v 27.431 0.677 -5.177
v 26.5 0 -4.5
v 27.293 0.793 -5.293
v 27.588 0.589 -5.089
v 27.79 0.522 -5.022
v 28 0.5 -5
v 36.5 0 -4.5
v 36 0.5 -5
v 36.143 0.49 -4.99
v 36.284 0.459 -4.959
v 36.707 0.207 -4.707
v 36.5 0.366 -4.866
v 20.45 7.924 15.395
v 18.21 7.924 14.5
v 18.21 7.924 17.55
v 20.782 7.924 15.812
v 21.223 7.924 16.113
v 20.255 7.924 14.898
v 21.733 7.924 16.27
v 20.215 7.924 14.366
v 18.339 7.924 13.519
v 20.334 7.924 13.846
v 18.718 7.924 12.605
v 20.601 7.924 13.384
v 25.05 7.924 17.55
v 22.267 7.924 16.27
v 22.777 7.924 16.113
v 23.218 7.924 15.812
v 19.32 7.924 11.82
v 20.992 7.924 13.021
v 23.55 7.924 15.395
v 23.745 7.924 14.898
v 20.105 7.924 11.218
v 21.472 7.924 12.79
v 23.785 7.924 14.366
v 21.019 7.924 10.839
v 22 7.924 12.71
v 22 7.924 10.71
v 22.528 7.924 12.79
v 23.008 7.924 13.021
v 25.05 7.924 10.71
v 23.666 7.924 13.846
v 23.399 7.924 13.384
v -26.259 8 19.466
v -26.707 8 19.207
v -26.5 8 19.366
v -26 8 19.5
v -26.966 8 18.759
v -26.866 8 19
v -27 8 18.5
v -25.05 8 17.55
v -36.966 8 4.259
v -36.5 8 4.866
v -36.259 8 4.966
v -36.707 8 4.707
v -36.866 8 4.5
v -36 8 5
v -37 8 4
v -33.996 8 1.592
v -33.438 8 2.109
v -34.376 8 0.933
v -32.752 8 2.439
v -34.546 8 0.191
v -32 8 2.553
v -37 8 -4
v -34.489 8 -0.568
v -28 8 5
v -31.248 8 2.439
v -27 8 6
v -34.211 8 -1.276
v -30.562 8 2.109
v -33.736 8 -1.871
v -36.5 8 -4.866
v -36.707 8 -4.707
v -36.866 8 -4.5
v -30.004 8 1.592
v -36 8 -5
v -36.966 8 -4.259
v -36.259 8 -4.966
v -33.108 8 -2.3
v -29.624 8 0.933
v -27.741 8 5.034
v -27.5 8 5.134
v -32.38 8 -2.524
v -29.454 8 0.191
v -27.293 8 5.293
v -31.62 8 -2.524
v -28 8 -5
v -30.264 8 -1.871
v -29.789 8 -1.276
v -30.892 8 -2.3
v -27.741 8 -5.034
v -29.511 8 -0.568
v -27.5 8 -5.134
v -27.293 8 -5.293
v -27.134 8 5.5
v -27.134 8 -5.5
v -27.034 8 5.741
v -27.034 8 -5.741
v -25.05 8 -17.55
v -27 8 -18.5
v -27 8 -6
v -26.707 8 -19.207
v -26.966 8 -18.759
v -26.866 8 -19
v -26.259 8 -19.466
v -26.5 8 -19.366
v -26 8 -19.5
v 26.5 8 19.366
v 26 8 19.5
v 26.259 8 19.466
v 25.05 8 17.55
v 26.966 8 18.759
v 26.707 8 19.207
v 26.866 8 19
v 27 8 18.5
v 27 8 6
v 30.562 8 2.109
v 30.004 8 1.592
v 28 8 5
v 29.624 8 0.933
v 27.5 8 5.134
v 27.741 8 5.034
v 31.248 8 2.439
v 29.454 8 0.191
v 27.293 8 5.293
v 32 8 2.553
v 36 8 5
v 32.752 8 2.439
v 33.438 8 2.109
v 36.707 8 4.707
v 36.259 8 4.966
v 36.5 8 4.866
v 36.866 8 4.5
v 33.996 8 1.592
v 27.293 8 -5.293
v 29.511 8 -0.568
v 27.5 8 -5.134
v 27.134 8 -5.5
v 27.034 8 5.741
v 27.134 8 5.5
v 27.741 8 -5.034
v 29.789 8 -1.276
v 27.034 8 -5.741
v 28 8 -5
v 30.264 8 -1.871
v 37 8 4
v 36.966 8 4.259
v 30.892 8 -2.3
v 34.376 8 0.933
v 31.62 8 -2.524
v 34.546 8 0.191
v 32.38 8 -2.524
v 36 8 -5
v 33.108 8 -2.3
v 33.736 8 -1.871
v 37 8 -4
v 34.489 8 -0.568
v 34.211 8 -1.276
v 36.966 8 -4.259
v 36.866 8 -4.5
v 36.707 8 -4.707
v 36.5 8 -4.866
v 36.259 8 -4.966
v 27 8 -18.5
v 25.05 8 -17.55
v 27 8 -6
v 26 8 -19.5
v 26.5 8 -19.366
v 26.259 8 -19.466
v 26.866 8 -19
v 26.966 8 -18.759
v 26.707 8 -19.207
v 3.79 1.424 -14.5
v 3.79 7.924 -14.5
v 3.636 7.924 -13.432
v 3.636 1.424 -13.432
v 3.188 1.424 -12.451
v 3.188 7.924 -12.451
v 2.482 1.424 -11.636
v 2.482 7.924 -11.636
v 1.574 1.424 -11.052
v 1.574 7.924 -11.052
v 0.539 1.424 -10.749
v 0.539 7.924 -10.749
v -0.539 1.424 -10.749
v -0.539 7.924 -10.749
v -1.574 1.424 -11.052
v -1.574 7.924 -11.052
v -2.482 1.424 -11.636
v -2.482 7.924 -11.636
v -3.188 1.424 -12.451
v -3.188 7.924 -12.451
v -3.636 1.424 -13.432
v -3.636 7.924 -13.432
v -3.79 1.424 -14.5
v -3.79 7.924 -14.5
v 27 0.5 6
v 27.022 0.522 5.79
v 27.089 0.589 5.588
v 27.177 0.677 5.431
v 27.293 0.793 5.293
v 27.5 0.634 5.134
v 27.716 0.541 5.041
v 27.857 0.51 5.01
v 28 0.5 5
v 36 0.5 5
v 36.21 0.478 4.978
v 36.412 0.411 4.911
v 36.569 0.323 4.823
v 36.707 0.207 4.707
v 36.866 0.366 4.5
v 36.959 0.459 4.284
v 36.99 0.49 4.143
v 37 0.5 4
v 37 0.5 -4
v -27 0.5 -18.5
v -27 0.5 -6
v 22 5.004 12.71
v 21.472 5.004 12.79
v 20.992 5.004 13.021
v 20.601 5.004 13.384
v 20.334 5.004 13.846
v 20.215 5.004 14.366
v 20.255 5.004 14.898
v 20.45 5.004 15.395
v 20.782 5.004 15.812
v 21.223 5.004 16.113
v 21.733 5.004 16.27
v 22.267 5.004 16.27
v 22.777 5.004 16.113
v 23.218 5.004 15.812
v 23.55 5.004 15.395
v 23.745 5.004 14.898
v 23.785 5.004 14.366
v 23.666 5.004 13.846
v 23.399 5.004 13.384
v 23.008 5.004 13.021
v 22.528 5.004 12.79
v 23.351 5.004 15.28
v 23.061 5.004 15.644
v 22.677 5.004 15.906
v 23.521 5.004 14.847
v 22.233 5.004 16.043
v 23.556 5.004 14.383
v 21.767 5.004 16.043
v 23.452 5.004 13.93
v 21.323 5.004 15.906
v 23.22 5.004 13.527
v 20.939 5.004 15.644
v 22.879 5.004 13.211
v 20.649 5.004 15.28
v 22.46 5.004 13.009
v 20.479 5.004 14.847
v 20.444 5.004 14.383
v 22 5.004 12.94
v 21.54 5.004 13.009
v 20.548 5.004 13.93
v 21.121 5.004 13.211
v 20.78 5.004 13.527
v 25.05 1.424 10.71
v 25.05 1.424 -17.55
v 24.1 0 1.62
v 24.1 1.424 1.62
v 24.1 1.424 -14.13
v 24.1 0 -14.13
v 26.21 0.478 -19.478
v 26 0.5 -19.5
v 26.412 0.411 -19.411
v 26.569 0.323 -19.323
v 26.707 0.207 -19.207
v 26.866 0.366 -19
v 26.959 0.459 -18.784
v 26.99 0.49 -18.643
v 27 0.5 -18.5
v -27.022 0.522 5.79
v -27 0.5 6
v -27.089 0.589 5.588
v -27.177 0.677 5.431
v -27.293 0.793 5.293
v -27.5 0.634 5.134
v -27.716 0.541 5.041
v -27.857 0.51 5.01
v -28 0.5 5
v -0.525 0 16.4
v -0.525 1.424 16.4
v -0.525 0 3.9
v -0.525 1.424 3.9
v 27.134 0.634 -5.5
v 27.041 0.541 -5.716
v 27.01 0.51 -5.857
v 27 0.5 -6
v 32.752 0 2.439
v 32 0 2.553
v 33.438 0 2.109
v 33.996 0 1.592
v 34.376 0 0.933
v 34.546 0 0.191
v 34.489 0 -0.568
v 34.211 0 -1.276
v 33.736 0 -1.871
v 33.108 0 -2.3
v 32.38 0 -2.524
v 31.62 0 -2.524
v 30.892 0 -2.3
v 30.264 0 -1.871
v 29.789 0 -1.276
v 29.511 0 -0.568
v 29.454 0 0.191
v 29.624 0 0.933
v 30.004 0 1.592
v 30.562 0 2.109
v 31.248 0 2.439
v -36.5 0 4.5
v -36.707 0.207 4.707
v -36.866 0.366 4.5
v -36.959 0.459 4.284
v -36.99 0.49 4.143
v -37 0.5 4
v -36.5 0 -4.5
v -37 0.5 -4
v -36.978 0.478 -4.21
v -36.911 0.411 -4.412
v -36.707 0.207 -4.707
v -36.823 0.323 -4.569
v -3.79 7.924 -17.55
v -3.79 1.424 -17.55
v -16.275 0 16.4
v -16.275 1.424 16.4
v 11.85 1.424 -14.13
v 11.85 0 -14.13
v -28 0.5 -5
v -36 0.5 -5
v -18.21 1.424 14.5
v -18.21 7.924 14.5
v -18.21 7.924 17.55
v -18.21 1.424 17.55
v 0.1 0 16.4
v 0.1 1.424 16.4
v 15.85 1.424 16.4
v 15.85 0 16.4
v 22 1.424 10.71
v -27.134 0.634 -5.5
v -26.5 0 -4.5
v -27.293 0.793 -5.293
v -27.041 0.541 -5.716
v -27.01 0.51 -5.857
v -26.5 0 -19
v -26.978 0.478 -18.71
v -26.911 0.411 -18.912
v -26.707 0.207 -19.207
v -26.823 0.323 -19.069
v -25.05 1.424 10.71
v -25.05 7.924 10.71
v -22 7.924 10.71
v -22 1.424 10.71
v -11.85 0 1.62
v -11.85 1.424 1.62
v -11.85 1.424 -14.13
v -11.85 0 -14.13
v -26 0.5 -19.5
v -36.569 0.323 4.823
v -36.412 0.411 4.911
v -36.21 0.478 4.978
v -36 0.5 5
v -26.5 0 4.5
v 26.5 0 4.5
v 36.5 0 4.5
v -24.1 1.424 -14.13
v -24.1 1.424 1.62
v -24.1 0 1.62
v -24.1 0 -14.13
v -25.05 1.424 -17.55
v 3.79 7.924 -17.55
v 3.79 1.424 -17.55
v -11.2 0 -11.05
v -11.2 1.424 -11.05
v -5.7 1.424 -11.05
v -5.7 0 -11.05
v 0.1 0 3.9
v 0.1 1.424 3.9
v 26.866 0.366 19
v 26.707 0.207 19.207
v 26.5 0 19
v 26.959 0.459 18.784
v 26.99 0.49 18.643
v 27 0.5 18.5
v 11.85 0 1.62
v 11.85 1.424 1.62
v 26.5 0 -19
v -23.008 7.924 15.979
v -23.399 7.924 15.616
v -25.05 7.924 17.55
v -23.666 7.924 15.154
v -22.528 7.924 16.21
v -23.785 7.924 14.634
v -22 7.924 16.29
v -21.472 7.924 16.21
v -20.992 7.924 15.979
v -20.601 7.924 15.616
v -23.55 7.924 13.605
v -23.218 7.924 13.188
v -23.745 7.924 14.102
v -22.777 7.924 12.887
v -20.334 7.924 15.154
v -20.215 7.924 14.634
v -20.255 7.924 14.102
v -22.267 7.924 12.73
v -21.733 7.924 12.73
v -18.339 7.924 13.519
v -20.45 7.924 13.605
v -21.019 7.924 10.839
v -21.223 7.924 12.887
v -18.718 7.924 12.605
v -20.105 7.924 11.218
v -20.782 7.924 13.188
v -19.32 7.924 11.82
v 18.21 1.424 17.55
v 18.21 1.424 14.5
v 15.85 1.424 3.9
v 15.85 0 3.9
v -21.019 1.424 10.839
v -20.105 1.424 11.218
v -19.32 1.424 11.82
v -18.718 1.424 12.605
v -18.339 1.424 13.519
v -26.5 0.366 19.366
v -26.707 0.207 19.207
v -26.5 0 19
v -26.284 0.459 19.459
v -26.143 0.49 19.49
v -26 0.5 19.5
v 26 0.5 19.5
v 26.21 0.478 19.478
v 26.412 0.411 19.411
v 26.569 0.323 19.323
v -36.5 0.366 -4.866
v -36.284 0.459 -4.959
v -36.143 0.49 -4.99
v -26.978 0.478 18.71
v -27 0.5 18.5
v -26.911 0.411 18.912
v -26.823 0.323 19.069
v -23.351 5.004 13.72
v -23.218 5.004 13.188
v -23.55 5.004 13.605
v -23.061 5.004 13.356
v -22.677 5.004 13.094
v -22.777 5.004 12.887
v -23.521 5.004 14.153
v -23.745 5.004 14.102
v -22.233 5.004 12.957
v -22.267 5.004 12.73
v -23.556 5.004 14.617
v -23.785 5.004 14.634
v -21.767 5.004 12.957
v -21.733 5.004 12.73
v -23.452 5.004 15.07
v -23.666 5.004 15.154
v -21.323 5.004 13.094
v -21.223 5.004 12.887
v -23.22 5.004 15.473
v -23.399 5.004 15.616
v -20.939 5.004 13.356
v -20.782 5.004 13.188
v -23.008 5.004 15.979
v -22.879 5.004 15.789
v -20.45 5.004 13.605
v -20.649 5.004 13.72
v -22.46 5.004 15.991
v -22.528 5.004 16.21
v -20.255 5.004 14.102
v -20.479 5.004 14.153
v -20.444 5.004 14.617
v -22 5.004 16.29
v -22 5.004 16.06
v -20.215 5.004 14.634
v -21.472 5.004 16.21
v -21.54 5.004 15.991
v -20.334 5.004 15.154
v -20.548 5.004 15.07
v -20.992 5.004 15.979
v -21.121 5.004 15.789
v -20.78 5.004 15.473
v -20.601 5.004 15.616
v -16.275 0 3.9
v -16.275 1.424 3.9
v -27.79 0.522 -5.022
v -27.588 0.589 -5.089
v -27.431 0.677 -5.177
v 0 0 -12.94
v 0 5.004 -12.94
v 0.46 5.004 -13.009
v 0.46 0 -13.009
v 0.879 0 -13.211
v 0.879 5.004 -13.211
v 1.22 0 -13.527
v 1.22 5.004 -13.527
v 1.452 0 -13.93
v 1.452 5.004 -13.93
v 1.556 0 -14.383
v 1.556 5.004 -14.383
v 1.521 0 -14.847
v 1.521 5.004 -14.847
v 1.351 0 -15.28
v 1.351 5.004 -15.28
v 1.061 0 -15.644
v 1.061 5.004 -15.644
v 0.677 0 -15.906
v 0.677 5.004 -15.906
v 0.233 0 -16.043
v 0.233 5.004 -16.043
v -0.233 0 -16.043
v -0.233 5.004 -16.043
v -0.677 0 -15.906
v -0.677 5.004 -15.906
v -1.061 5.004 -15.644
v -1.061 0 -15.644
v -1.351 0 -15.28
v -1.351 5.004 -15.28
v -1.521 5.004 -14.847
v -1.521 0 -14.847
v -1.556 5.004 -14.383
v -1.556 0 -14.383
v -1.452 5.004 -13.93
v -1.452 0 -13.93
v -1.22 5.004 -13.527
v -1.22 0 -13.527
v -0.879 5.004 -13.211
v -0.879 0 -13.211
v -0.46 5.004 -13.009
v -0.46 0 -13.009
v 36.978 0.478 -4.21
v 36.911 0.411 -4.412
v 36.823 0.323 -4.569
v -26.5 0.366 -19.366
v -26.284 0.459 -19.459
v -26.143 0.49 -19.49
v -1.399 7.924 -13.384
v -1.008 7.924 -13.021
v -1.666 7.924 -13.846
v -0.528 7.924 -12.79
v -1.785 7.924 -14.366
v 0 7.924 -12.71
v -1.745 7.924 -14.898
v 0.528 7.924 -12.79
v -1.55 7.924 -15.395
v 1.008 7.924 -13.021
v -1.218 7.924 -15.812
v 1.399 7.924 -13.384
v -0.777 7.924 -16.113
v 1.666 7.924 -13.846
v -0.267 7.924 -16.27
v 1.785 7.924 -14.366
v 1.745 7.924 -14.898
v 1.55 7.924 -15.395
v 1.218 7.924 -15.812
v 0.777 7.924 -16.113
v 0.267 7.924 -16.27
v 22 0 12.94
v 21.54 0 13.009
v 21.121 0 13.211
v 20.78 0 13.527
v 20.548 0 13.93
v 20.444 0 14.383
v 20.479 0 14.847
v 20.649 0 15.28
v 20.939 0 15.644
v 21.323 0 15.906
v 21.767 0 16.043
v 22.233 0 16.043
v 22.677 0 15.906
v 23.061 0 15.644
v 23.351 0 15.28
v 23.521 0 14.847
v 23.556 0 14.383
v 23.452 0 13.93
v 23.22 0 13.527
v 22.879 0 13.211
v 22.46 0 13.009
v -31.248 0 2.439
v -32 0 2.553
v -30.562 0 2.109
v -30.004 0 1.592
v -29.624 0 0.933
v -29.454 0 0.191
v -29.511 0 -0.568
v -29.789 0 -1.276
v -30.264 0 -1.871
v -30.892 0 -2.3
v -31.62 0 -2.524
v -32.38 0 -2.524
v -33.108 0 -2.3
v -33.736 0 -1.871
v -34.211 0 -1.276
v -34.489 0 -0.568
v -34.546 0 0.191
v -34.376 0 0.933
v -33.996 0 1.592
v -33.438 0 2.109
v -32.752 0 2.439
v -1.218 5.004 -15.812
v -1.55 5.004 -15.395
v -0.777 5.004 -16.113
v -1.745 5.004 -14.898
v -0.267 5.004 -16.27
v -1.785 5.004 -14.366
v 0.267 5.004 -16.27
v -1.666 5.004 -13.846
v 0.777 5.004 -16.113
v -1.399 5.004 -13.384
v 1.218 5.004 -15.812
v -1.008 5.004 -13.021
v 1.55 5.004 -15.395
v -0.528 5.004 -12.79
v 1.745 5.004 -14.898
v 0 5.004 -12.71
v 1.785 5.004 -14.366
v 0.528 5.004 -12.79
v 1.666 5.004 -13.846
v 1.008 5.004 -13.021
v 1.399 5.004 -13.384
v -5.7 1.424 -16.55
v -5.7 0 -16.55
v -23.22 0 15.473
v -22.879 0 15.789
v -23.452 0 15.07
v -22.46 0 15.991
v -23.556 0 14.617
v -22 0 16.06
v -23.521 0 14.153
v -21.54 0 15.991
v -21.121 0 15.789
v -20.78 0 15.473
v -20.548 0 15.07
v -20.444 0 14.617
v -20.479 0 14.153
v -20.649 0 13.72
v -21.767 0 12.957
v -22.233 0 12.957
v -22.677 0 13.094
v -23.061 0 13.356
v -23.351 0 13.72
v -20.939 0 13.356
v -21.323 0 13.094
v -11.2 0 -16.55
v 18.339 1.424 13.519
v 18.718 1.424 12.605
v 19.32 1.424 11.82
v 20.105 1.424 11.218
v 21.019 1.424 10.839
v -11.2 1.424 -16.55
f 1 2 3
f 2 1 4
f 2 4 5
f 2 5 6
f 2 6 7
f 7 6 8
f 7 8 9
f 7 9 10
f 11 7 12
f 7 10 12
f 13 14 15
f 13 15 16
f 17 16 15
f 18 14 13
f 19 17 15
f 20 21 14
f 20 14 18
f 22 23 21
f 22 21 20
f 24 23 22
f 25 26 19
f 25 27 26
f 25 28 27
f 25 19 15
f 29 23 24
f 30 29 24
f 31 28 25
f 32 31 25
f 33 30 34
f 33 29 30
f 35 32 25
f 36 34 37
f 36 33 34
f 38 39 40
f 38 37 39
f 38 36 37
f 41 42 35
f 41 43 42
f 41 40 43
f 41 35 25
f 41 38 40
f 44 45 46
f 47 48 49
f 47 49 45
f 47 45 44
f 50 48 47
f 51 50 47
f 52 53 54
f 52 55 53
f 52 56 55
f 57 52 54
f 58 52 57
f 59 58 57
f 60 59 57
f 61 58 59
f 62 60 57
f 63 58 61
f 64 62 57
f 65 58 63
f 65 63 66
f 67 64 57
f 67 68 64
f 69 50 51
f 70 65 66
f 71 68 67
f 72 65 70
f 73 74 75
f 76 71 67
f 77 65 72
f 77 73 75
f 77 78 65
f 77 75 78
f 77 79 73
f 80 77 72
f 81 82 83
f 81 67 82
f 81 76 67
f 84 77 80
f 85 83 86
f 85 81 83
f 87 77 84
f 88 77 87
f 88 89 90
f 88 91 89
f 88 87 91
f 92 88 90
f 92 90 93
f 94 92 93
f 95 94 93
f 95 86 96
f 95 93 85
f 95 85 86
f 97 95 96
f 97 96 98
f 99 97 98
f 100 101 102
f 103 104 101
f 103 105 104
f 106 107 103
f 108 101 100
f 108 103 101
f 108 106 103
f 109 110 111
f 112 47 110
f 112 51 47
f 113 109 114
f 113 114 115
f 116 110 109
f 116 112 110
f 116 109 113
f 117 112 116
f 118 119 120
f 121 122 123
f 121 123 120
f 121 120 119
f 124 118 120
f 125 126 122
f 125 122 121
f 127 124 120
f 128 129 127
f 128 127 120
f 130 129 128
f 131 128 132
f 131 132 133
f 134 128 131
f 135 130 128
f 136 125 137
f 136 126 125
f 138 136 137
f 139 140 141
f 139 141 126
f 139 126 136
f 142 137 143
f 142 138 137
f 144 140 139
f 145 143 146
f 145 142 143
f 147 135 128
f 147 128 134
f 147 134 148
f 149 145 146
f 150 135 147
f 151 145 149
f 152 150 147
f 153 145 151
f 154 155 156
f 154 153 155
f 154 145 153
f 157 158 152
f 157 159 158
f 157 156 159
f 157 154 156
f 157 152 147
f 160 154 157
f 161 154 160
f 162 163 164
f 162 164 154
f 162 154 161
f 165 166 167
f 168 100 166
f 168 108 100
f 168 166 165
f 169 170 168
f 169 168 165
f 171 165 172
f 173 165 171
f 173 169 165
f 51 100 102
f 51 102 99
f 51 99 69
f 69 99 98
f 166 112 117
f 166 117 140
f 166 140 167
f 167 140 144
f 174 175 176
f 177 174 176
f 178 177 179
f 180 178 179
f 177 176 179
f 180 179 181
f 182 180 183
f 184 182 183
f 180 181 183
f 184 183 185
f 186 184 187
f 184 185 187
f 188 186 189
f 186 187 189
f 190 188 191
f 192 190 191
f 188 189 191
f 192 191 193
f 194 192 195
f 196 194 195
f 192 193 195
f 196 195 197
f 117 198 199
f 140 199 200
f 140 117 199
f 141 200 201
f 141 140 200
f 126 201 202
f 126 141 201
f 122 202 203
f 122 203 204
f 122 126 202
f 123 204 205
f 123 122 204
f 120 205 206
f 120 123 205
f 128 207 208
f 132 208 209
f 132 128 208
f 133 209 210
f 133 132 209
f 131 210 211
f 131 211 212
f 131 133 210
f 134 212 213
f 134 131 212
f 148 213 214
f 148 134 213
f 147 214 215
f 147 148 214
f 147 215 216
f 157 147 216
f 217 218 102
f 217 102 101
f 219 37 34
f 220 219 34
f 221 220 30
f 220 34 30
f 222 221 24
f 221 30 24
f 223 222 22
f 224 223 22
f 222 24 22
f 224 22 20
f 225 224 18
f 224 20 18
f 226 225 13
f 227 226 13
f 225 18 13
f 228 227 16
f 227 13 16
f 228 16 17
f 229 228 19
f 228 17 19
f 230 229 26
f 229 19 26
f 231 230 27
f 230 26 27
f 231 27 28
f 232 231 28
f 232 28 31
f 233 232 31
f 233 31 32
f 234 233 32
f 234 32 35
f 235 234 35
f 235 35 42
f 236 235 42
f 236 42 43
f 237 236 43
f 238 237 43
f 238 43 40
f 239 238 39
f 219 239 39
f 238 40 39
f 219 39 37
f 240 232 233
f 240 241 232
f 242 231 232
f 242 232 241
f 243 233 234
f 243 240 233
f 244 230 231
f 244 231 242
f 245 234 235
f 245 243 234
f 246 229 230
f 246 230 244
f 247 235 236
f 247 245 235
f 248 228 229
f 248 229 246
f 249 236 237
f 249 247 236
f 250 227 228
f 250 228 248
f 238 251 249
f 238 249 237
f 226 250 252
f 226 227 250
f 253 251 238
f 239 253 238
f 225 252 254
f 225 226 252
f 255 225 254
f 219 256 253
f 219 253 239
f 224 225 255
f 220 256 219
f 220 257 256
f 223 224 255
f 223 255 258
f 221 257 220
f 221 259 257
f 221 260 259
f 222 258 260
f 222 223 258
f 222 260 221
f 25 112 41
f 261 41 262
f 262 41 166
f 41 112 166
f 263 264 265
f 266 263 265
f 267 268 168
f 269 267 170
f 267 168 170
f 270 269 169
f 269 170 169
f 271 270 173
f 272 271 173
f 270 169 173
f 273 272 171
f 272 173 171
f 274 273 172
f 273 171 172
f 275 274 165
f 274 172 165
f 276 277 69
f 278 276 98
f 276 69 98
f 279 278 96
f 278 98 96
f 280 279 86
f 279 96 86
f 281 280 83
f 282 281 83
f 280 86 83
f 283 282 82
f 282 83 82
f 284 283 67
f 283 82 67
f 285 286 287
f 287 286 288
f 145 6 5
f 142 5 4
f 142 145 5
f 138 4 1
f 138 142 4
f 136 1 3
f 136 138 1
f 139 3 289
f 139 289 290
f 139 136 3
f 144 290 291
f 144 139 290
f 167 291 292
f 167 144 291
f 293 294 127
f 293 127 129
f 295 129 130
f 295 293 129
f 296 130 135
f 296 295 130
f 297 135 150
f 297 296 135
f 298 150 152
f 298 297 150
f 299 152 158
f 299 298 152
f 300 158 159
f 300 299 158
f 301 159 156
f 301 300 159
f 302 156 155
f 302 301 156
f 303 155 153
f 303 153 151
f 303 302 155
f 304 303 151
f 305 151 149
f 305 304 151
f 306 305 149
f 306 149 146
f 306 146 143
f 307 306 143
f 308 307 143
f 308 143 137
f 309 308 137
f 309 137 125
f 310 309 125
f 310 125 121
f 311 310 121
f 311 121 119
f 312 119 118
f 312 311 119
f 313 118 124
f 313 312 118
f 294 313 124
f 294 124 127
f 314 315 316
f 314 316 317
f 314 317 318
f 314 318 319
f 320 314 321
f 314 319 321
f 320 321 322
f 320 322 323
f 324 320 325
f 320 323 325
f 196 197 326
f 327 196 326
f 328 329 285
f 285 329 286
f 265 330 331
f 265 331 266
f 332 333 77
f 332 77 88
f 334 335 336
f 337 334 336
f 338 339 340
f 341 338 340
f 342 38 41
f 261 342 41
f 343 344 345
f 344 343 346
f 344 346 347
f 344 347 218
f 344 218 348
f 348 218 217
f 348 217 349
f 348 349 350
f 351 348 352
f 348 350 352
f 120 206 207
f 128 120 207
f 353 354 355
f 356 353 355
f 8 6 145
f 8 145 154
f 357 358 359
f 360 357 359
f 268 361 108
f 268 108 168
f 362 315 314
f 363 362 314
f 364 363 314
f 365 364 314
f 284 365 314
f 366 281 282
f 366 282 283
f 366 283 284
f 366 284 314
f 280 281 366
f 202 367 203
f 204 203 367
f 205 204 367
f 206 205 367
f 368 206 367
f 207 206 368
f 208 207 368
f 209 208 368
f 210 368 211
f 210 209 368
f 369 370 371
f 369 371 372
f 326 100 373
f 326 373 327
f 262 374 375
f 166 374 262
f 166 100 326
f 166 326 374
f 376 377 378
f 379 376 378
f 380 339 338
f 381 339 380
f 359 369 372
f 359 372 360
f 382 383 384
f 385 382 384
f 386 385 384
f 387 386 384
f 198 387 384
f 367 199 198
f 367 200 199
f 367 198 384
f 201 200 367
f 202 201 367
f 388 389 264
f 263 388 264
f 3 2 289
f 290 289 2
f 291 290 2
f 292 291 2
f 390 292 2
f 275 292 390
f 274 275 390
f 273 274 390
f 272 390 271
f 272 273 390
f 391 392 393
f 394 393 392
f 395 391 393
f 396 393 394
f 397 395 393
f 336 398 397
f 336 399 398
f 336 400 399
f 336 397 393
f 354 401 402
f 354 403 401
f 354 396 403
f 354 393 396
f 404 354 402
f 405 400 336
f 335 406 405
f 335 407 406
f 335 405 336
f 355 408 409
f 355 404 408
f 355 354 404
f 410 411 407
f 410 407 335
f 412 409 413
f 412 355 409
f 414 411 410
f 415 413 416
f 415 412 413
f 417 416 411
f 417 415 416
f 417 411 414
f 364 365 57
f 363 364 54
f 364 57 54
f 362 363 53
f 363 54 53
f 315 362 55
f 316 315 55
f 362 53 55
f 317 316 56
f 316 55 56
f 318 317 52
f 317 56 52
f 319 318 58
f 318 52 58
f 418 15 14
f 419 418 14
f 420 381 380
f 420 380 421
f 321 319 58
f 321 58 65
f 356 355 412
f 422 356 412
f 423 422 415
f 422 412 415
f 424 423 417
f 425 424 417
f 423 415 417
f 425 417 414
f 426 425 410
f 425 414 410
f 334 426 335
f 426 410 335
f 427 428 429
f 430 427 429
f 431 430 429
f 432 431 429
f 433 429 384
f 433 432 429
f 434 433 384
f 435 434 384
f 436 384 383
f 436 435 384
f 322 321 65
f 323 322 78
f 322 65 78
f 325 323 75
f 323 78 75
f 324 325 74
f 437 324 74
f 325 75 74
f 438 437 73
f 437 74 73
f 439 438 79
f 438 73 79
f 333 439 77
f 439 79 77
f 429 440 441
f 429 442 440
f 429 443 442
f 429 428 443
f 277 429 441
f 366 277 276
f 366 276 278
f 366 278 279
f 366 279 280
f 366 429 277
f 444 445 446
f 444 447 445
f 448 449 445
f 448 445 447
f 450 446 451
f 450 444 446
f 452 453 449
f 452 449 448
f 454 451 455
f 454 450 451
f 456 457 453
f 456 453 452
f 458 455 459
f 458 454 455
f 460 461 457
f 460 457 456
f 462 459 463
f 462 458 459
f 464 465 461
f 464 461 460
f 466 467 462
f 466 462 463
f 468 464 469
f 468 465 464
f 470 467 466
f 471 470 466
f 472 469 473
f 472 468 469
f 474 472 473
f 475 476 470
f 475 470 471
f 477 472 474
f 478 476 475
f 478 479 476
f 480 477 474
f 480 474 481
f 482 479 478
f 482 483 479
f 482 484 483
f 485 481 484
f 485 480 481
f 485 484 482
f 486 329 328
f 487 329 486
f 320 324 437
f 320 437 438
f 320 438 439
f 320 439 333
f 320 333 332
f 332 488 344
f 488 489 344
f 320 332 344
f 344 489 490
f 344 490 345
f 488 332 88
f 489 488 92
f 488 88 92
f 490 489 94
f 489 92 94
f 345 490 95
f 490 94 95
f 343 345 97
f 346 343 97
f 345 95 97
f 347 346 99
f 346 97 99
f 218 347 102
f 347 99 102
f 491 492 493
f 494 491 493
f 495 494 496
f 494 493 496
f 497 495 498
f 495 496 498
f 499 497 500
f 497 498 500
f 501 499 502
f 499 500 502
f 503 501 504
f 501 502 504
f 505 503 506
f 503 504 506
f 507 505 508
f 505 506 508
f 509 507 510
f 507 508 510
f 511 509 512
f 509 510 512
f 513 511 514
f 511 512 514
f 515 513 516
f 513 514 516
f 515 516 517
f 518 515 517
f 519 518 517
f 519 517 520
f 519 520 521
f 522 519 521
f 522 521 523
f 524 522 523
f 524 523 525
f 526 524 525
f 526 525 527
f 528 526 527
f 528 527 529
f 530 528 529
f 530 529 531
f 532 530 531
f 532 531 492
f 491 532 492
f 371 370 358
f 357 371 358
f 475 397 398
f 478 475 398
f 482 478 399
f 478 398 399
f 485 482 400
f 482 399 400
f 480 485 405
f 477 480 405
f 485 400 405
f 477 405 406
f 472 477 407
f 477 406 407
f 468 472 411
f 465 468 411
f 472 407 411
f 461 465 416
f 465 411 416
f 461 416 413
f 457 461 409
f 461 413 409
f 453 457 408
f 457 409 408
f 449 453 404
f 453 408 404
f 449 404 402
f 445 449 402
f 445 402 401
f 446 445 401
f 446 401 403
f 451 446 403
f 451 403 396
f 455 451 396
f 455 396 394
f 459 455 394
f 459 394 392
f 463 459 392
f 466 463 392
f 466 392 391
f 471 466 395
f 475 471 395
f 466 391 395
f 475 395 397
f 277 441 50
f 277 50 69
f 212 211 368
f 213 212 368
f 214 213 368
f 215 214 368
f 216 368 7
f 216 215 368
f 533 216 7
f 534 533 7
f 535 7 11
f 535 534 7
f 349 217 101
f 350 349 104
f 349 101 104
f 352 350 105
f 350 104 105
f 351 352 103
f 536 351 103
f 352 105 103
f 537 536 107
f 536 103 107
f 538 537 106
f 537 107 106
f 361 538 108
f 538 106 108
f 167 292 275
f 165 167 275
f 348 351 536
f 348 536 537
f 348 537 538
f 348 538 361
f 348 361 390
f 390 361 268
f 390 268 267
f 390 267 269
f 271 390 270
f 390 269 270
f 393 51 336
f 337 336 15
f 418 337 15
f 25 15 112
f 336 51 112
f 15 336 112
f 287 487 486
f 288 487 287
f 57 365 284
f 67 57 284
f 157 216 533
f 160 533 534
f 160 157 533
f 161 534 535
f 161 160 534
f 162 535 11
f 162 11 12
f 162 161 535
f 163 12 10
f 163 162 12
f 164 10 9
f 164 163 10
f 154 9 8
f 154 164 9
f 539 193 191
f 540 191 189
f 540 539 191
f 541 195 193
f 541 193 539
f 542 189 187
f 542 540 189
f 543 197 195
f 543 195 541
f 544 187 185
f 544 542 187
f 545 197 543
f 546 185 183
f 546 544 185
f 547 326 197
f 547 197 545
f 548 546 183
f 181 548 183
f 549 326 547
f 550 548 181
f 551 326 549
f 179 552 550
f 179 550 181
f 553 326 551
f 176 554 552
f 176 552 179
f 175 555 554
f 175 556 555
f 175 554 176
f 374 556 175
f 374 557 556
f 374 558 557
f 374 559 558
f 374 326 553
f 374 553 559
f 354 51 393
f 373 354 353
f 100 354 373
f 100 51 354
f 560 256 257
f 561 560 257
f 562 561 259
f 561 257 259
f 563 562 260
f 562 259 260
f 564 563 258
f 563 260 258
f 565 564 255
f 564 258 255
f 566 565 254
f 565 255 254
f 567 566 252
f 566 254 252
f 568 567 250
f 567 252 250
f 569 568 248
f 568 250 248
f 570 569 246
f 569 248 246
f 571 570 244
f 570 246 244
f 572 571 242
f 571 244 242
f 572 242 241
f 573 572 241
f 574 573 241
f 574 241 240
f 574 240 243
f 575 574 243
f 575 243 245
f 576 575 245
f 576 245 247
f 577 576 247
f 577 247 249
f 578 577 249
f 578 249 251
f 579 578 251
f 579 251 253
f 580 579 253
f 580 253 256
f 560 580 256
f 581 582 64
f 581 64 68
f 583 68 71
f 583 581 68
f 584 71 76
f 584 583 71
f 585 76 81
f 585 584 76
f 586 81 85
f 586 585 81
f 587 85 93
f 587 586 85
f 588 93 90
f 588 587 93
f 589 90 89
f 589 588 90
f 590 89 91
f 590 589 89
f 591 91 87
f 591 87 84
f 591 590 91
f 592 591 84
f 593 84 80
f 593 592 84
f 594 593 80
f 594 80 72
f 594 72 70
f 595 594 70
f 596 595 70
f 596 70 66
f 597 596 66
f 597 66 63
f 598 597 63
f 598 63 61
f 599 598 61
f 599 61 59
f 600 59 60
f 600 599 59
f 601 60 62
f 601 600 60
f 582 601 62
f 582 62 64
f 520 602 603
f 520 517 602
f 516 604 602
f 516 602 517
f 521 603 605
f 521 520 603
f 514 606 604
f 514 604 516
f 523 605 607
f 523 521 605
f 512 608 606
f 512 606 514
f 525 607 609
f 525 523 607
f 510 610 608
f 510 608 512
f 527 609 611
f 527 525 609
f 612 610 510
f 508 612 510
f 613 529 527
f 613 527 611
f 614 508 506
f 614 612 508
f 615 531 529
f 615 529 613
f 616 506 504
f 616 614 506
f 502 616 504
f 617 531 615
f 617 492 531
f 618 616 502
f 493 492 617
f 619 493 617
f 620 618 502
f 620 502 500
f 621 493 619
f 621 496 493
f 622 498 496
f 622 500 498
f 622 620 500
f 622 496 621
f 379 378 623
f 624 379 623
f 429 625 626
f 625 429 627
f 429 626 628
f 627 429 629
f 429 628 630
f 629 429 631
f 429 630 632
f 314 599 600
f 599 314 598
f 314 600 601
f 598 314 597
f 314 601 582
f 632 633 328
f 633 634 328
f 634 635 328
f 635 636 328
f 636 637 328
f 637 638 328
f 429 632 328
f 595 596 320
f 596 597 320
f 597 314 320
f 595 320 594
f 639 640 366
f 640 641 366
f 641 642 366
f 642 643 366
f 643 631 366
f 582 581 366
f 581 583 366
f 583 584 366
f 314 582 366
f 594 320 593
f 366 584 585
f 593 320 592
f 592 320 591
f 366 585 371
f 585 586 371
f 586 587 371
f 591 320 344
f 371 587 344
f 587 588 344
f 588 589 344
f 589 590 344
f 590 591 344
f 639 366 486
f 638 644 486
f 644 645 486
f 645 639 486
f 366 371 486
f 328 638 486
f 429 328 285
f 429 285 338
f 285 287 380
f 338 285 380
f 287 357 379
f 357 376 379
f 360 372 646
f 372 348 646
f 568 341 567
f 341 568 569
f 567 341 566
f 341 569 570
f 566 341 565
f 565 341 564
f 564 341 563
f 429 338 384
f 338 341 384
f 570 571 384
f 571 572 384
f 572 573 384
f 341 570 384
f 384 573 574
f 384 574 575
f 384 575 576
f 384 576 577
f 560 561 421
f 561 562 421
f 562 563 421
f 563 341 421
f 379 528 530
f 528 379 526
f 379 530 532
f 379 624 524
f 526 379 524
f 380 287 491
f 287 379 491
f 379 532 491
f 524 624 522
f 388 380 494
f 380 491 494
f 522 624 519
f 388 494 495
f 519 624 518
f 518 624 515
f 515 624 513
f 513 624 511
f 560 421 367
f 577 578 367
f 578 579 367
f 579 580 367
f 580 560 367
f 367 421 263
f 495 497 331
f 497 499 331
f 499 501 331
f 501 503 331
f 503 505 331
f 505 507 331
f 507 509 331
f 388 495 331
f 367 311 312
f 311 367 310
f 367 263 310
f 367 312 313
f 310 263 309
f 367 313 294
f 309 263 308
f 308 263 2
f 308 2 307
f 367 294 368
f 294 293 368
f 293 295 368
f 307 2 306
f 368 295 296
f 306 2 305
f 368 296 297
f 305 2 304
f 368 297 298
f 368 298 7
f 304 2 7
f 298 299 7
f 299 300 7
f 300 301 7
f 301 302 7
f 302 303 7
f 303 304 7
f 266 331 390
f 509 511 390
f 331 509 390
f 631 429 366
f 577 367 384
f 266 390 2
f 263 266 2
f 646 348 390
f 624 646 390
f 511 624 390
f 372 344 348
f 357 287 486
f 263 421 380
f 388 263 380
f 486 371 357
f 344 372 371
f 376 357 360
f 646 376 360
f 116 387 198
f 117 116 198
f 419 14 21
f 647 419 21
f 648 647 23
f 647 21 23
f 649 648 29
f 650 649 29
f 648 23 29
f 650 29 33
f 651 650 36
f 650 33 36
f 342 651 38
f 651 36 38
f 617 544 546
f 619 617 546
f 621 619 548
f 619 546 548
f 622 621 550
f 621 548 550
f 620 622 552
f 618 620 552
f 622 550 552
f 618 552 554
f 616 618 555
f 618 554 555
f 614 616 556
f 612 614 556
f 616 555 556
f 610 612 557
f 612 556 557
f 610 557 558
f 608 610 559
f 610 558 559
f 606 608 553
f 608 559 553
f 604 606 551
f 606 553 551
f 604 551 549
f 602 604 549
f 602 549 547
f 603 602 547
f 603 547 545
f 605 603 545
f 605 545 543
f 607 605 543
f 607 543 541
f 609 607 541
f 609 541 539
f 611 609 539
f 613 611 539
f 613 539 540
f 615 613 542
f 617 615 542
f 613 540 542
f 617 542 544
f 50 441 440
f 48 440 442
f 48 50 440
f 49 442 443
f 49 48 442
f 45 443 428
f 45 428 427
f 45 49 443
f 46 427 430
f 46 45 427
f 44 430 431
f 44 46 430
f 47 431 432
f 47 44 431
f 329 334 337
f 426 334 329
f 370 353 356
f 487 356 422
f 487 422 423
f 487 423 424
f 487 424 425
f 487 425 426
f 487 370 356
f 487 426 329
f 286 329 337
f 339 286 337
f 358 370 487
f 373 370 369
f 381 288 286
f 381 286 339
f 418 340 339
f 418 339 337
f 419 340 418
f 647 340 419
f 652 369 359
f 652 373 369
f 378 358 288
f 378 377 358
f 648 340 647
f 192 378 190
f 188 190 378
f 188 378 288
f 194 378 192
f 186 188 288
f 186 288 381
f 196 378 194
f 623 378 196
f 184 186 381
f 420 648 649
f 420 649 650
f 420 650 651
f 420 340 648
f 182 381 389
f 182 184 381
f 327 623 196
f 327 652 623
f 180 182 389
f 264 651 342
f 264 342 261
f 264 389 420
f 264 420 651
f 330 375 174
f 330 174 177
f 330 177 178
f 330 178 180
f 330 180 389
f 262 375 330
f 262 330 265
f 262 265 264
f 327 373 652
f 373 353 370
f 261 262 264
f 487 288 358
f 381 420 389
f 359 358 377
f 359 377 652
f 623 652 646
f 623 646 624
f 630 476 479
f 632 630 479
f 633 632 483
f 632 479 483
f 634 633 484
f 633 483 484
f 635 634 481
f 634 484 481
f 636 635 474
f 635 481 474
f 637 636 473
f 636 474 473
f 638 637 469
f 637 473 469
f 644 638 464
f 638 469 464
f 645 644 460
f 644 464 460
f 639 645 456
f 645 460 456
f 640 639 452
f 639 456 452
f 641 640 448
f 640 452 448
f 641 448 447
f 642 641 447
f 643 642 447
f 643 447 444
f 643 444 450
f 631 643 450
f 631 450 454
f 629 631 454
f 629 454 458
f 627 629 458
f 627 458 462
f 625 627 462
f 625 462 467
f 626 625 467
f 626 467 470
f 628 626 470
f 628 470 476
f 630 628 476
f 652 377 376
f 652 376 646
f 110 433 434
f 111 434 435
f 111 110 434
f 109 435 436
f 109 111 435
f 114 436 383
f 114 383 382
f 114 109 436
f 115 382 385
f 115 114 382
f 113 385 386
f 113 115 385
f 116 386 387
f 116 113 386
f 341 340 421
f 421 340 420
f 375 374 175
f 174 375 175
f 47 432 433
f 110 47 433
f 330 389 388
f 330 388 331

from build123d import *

# Parameters (mm, degrees)
SKETCH1_W           = 54
SKETCH1_H           = 39
SKETCH1_W_2         = 10
SKETCH1_H_2         = 10
SKETCH1_R           = 2.5527
BOSS_EXTRUDE1_DEPTH = 8
SKETCH2_W           = 50.1
SKETCH2_H           = 35.1
CUT_EXTRUDE1_DEPTH  = 0.0762
CUT_EXTRUDE2_DEPTH  = 6.5
SKETCH4_R           = 1.56
CUT_EXTRUDE3_DEPTH  = 43.568023286
SKETCH5_R           = 1.79
CUT_EXTRUDE4_DEPTH  = 2.92
SKETCH6_W           = 12.25
SKETCH6_H           = 15.75
SKETCH6_W_2         = 15.75
SKETCH6_H_2         = 12.5
SKETCH6_W_3         = 5.5
SKETCH6_H_3         = 5.5
CUT_EXTRUDE5_DEPTH  = 43.337883821
CHAMFER1_SIZE       = 0.5
FILLET1_R           = 1


with BuildPart() as part:
    # Sketch1 → Boss-Extrude1 (new body)
    # profile 1 of 3: a face of its own
    with BuildSketch(Plane(origin=(0, 0, 0), x_dir=(1, 0, 0), z_dir=(0, 1, 0))):
        Rectangle(SKETCH1_W, SKETCH1_H)
    # profile 2 of 3: a face of its own
    with BuildSketch(Plane(origin=(0, 0, 0), x_dir=(1, 0, 0), z_dir=(0, 1, 0))):
        with Locations((32, 0)):
            Rectangle(SKETCH1_W_2, SKETCH1_H_2)
        with Locations(Location((32, 0, 0), (0, 0, 270))):
            Circle(SKETCH1_R, mode=Mode.SUBTRACT)
    # profile 3 of 3: a face of its own
    with BuildSketch(Plane(origin=(0, 0, 0), x_dir=(1, 0, 0), z_dir=(0, 1, 0))):
        with Locations((-32, 0)):
            Rectangle(SKETCH1_W_2, SKETCH1_H_2)
        with Locations(Location((-32, 0, 0), (0, 0, 270))):
            Circle(SKETCH1_R, mode=Mode.SUBTRACT)
    extrude(amount=BOSS_EXTRUDE1_DEPTH)

    # Sketch2 → Cut-Extrude1 (cut)
    with BuildSketch(Plane(origin=(0, 8, 0), x_dir=(1, 0, 0), z_dir=(0, 1, 0))):
        Rectangle(SKETCH2_W, SKETCH2_H)
    extrude(amount=-CUT_EXTRUDE1_DEPTH, mode=Mode.SUBTRACT)

    # Sketch3 → Cut-Extrude2 (cut)
    with BuildSketch(Plane(origin=(0, 7.9238, 0), x_dir=(1, 0, 0), z_dir=(0, 1, 0))):
        with BuildLine():
            Line((-3.79, 14.5), (-3.79, 17.55))
            Line((-3.79, 17.55), (-25.05, 17.55))
            Line((-25.05, 17.55), (-25.05, -10.71))
            Line((-25.05, -10.71), (-22, -10.71))
            ThreePointArc((-22, -10.71), (-19.320065299, -11.820065299), (-18.21, -14.5))
            Line((-18.21, -14.5), (-18.21, -17.55))
            Line((-18.21, -17.55), (18.21, -17.55))
            Line((18.21, -17.55), (18.21, -14.5))
            ThreePointArc((18.21, -14.5), (19.320065299, -11.820065299), (22, -10.71))
            Line((22, -10.71), (25.05, -10.71))
            Line((25.05, -10.71), (25.05, 17.55))
            Line((25.05, 17.55), (3.79, 17.55))
            Line((3.79, 17.55), (3.79, 14.5))
            ThreePointArc((3.79, 14.5), (0, 10.71), (-3.79, 14.5))
        make_face()
    extrude(amount=-CUT_EXTRUDE2_DEPTH, mode=Mode.SUBTRACT)

    # Sketch4 → Cut-Extrude3 (cut, through all)
    with BuildSketch(Plane(origin=(0, 7.9238, 0), x_dir=(1, 0, 0), z_dir=(0, 1, 0))):
        with Locations(Location((0, 14.5, 0), (0, 0, 270))):
            Circle(SKETCH4_R)
        with Locations(Location((-22, -14.5, 0), (0, 0, 270))):
            Circle(SKETCH4_R)
        with Locations(Location((22, -14.5, 0), (0, 0, 90))):
            Circle(SKETCH4_R)
    extrude(amount=-CUT_EXTRUDE3_DEPTH, mode=Mode.SUBTRACT)

    # Sketch5 → Cut-Extrude4 (cut)
    with BuildSketch(Plane(origin=(0, 7.9238, 0), x_dir=(1, 0, 0), z_dir=(0, 1, 0))):
        with Locations(Location((0, 14.5, 0), (0, 0, 270))):
            Circle(SKETCH5_R)
        with Locations(Location((-22, -14.5, 0), (0, 0, 270))):
            Circle(SKETCH5_R)
        with Locations(Location((22, -14.5, 0), (0, 0, 90))):
            Circle(SKETCH5_R)
    extrude(amount=-CUT_EXTRUDE4_DEPTH, mode=Mode.SUBTRACT)

    # Sketch6 → Cut-Extrude5 (cut, through all)
    with BuildSketch(Plane(origin=(0, 1.4238, 0), x_dir=(1, 0, 0), z_dir=(0, 1, 0))):
        with Locations((17.975, 6.255)):
            Rectangle(SKETCH6_W, SKETCH6_H)
        with Locations((7.975, -10.15)):
            Rectangle(SKETCH6_W_2, SKETCH6_H_2)
        with Locations((-17.975, 6.255)):
            Rectangle(SKETCH6_W, SKETCH6_H)
        with Locations((-8.4, -10.15)):
            Rectangle(SKETCH6_W_2, SKETCH6_H_2)
        with Locations((-8.45, 13.8)):
            Rectangle(SKETCH6_W_3, SKETCH6_H_3)
    extrude(amount=-CUT_EXTRUDE5_DEPTH, mode=Mode.SUBTRACT)

    # Chamfer1
    chamfer1_edges = [part.edges().sort_by_distance(p)[0] for p in [
        (-27, 0, 12.25),
        (-32, 0, 5),
        (-37, 0, 0),
        (-32, 0, -5),
        (-27, 0, -12.25),
        (0, 0, -19.5),
        (27, 0, -12.25),
        (32, 0, -5),
        (37, 0, 0),
        (32, 0, 5),
        (27, 0, 12.25),
        (0, 0, 19.5),
    ]]
    chamfer(chamfer1_edges, length=CHAMFER1_SIZE)

    # Fillet1
    fillet1_edges = [part.edges().sort_by_distance(p)[0] for p in [
        (-27, 4.25, 19.5),
        (-27, 4.25, 5),
        (-37, 4.25, 5),
        (-37, 4.25, -5),
        (-27, 4.25, -5),
        (-27, 4.25, -19.5),
        (27, 4.25, -19.5),
        (27, 4.25, -5),
        (37, 4.25, -5),
        (37, 4.25, 5),
        (27, 4.25, 5),
        (27, 4.25, 19.5),
    ]]
    fillet(fillet1_edges, radius=FILLET1_R)


solid = part.part
